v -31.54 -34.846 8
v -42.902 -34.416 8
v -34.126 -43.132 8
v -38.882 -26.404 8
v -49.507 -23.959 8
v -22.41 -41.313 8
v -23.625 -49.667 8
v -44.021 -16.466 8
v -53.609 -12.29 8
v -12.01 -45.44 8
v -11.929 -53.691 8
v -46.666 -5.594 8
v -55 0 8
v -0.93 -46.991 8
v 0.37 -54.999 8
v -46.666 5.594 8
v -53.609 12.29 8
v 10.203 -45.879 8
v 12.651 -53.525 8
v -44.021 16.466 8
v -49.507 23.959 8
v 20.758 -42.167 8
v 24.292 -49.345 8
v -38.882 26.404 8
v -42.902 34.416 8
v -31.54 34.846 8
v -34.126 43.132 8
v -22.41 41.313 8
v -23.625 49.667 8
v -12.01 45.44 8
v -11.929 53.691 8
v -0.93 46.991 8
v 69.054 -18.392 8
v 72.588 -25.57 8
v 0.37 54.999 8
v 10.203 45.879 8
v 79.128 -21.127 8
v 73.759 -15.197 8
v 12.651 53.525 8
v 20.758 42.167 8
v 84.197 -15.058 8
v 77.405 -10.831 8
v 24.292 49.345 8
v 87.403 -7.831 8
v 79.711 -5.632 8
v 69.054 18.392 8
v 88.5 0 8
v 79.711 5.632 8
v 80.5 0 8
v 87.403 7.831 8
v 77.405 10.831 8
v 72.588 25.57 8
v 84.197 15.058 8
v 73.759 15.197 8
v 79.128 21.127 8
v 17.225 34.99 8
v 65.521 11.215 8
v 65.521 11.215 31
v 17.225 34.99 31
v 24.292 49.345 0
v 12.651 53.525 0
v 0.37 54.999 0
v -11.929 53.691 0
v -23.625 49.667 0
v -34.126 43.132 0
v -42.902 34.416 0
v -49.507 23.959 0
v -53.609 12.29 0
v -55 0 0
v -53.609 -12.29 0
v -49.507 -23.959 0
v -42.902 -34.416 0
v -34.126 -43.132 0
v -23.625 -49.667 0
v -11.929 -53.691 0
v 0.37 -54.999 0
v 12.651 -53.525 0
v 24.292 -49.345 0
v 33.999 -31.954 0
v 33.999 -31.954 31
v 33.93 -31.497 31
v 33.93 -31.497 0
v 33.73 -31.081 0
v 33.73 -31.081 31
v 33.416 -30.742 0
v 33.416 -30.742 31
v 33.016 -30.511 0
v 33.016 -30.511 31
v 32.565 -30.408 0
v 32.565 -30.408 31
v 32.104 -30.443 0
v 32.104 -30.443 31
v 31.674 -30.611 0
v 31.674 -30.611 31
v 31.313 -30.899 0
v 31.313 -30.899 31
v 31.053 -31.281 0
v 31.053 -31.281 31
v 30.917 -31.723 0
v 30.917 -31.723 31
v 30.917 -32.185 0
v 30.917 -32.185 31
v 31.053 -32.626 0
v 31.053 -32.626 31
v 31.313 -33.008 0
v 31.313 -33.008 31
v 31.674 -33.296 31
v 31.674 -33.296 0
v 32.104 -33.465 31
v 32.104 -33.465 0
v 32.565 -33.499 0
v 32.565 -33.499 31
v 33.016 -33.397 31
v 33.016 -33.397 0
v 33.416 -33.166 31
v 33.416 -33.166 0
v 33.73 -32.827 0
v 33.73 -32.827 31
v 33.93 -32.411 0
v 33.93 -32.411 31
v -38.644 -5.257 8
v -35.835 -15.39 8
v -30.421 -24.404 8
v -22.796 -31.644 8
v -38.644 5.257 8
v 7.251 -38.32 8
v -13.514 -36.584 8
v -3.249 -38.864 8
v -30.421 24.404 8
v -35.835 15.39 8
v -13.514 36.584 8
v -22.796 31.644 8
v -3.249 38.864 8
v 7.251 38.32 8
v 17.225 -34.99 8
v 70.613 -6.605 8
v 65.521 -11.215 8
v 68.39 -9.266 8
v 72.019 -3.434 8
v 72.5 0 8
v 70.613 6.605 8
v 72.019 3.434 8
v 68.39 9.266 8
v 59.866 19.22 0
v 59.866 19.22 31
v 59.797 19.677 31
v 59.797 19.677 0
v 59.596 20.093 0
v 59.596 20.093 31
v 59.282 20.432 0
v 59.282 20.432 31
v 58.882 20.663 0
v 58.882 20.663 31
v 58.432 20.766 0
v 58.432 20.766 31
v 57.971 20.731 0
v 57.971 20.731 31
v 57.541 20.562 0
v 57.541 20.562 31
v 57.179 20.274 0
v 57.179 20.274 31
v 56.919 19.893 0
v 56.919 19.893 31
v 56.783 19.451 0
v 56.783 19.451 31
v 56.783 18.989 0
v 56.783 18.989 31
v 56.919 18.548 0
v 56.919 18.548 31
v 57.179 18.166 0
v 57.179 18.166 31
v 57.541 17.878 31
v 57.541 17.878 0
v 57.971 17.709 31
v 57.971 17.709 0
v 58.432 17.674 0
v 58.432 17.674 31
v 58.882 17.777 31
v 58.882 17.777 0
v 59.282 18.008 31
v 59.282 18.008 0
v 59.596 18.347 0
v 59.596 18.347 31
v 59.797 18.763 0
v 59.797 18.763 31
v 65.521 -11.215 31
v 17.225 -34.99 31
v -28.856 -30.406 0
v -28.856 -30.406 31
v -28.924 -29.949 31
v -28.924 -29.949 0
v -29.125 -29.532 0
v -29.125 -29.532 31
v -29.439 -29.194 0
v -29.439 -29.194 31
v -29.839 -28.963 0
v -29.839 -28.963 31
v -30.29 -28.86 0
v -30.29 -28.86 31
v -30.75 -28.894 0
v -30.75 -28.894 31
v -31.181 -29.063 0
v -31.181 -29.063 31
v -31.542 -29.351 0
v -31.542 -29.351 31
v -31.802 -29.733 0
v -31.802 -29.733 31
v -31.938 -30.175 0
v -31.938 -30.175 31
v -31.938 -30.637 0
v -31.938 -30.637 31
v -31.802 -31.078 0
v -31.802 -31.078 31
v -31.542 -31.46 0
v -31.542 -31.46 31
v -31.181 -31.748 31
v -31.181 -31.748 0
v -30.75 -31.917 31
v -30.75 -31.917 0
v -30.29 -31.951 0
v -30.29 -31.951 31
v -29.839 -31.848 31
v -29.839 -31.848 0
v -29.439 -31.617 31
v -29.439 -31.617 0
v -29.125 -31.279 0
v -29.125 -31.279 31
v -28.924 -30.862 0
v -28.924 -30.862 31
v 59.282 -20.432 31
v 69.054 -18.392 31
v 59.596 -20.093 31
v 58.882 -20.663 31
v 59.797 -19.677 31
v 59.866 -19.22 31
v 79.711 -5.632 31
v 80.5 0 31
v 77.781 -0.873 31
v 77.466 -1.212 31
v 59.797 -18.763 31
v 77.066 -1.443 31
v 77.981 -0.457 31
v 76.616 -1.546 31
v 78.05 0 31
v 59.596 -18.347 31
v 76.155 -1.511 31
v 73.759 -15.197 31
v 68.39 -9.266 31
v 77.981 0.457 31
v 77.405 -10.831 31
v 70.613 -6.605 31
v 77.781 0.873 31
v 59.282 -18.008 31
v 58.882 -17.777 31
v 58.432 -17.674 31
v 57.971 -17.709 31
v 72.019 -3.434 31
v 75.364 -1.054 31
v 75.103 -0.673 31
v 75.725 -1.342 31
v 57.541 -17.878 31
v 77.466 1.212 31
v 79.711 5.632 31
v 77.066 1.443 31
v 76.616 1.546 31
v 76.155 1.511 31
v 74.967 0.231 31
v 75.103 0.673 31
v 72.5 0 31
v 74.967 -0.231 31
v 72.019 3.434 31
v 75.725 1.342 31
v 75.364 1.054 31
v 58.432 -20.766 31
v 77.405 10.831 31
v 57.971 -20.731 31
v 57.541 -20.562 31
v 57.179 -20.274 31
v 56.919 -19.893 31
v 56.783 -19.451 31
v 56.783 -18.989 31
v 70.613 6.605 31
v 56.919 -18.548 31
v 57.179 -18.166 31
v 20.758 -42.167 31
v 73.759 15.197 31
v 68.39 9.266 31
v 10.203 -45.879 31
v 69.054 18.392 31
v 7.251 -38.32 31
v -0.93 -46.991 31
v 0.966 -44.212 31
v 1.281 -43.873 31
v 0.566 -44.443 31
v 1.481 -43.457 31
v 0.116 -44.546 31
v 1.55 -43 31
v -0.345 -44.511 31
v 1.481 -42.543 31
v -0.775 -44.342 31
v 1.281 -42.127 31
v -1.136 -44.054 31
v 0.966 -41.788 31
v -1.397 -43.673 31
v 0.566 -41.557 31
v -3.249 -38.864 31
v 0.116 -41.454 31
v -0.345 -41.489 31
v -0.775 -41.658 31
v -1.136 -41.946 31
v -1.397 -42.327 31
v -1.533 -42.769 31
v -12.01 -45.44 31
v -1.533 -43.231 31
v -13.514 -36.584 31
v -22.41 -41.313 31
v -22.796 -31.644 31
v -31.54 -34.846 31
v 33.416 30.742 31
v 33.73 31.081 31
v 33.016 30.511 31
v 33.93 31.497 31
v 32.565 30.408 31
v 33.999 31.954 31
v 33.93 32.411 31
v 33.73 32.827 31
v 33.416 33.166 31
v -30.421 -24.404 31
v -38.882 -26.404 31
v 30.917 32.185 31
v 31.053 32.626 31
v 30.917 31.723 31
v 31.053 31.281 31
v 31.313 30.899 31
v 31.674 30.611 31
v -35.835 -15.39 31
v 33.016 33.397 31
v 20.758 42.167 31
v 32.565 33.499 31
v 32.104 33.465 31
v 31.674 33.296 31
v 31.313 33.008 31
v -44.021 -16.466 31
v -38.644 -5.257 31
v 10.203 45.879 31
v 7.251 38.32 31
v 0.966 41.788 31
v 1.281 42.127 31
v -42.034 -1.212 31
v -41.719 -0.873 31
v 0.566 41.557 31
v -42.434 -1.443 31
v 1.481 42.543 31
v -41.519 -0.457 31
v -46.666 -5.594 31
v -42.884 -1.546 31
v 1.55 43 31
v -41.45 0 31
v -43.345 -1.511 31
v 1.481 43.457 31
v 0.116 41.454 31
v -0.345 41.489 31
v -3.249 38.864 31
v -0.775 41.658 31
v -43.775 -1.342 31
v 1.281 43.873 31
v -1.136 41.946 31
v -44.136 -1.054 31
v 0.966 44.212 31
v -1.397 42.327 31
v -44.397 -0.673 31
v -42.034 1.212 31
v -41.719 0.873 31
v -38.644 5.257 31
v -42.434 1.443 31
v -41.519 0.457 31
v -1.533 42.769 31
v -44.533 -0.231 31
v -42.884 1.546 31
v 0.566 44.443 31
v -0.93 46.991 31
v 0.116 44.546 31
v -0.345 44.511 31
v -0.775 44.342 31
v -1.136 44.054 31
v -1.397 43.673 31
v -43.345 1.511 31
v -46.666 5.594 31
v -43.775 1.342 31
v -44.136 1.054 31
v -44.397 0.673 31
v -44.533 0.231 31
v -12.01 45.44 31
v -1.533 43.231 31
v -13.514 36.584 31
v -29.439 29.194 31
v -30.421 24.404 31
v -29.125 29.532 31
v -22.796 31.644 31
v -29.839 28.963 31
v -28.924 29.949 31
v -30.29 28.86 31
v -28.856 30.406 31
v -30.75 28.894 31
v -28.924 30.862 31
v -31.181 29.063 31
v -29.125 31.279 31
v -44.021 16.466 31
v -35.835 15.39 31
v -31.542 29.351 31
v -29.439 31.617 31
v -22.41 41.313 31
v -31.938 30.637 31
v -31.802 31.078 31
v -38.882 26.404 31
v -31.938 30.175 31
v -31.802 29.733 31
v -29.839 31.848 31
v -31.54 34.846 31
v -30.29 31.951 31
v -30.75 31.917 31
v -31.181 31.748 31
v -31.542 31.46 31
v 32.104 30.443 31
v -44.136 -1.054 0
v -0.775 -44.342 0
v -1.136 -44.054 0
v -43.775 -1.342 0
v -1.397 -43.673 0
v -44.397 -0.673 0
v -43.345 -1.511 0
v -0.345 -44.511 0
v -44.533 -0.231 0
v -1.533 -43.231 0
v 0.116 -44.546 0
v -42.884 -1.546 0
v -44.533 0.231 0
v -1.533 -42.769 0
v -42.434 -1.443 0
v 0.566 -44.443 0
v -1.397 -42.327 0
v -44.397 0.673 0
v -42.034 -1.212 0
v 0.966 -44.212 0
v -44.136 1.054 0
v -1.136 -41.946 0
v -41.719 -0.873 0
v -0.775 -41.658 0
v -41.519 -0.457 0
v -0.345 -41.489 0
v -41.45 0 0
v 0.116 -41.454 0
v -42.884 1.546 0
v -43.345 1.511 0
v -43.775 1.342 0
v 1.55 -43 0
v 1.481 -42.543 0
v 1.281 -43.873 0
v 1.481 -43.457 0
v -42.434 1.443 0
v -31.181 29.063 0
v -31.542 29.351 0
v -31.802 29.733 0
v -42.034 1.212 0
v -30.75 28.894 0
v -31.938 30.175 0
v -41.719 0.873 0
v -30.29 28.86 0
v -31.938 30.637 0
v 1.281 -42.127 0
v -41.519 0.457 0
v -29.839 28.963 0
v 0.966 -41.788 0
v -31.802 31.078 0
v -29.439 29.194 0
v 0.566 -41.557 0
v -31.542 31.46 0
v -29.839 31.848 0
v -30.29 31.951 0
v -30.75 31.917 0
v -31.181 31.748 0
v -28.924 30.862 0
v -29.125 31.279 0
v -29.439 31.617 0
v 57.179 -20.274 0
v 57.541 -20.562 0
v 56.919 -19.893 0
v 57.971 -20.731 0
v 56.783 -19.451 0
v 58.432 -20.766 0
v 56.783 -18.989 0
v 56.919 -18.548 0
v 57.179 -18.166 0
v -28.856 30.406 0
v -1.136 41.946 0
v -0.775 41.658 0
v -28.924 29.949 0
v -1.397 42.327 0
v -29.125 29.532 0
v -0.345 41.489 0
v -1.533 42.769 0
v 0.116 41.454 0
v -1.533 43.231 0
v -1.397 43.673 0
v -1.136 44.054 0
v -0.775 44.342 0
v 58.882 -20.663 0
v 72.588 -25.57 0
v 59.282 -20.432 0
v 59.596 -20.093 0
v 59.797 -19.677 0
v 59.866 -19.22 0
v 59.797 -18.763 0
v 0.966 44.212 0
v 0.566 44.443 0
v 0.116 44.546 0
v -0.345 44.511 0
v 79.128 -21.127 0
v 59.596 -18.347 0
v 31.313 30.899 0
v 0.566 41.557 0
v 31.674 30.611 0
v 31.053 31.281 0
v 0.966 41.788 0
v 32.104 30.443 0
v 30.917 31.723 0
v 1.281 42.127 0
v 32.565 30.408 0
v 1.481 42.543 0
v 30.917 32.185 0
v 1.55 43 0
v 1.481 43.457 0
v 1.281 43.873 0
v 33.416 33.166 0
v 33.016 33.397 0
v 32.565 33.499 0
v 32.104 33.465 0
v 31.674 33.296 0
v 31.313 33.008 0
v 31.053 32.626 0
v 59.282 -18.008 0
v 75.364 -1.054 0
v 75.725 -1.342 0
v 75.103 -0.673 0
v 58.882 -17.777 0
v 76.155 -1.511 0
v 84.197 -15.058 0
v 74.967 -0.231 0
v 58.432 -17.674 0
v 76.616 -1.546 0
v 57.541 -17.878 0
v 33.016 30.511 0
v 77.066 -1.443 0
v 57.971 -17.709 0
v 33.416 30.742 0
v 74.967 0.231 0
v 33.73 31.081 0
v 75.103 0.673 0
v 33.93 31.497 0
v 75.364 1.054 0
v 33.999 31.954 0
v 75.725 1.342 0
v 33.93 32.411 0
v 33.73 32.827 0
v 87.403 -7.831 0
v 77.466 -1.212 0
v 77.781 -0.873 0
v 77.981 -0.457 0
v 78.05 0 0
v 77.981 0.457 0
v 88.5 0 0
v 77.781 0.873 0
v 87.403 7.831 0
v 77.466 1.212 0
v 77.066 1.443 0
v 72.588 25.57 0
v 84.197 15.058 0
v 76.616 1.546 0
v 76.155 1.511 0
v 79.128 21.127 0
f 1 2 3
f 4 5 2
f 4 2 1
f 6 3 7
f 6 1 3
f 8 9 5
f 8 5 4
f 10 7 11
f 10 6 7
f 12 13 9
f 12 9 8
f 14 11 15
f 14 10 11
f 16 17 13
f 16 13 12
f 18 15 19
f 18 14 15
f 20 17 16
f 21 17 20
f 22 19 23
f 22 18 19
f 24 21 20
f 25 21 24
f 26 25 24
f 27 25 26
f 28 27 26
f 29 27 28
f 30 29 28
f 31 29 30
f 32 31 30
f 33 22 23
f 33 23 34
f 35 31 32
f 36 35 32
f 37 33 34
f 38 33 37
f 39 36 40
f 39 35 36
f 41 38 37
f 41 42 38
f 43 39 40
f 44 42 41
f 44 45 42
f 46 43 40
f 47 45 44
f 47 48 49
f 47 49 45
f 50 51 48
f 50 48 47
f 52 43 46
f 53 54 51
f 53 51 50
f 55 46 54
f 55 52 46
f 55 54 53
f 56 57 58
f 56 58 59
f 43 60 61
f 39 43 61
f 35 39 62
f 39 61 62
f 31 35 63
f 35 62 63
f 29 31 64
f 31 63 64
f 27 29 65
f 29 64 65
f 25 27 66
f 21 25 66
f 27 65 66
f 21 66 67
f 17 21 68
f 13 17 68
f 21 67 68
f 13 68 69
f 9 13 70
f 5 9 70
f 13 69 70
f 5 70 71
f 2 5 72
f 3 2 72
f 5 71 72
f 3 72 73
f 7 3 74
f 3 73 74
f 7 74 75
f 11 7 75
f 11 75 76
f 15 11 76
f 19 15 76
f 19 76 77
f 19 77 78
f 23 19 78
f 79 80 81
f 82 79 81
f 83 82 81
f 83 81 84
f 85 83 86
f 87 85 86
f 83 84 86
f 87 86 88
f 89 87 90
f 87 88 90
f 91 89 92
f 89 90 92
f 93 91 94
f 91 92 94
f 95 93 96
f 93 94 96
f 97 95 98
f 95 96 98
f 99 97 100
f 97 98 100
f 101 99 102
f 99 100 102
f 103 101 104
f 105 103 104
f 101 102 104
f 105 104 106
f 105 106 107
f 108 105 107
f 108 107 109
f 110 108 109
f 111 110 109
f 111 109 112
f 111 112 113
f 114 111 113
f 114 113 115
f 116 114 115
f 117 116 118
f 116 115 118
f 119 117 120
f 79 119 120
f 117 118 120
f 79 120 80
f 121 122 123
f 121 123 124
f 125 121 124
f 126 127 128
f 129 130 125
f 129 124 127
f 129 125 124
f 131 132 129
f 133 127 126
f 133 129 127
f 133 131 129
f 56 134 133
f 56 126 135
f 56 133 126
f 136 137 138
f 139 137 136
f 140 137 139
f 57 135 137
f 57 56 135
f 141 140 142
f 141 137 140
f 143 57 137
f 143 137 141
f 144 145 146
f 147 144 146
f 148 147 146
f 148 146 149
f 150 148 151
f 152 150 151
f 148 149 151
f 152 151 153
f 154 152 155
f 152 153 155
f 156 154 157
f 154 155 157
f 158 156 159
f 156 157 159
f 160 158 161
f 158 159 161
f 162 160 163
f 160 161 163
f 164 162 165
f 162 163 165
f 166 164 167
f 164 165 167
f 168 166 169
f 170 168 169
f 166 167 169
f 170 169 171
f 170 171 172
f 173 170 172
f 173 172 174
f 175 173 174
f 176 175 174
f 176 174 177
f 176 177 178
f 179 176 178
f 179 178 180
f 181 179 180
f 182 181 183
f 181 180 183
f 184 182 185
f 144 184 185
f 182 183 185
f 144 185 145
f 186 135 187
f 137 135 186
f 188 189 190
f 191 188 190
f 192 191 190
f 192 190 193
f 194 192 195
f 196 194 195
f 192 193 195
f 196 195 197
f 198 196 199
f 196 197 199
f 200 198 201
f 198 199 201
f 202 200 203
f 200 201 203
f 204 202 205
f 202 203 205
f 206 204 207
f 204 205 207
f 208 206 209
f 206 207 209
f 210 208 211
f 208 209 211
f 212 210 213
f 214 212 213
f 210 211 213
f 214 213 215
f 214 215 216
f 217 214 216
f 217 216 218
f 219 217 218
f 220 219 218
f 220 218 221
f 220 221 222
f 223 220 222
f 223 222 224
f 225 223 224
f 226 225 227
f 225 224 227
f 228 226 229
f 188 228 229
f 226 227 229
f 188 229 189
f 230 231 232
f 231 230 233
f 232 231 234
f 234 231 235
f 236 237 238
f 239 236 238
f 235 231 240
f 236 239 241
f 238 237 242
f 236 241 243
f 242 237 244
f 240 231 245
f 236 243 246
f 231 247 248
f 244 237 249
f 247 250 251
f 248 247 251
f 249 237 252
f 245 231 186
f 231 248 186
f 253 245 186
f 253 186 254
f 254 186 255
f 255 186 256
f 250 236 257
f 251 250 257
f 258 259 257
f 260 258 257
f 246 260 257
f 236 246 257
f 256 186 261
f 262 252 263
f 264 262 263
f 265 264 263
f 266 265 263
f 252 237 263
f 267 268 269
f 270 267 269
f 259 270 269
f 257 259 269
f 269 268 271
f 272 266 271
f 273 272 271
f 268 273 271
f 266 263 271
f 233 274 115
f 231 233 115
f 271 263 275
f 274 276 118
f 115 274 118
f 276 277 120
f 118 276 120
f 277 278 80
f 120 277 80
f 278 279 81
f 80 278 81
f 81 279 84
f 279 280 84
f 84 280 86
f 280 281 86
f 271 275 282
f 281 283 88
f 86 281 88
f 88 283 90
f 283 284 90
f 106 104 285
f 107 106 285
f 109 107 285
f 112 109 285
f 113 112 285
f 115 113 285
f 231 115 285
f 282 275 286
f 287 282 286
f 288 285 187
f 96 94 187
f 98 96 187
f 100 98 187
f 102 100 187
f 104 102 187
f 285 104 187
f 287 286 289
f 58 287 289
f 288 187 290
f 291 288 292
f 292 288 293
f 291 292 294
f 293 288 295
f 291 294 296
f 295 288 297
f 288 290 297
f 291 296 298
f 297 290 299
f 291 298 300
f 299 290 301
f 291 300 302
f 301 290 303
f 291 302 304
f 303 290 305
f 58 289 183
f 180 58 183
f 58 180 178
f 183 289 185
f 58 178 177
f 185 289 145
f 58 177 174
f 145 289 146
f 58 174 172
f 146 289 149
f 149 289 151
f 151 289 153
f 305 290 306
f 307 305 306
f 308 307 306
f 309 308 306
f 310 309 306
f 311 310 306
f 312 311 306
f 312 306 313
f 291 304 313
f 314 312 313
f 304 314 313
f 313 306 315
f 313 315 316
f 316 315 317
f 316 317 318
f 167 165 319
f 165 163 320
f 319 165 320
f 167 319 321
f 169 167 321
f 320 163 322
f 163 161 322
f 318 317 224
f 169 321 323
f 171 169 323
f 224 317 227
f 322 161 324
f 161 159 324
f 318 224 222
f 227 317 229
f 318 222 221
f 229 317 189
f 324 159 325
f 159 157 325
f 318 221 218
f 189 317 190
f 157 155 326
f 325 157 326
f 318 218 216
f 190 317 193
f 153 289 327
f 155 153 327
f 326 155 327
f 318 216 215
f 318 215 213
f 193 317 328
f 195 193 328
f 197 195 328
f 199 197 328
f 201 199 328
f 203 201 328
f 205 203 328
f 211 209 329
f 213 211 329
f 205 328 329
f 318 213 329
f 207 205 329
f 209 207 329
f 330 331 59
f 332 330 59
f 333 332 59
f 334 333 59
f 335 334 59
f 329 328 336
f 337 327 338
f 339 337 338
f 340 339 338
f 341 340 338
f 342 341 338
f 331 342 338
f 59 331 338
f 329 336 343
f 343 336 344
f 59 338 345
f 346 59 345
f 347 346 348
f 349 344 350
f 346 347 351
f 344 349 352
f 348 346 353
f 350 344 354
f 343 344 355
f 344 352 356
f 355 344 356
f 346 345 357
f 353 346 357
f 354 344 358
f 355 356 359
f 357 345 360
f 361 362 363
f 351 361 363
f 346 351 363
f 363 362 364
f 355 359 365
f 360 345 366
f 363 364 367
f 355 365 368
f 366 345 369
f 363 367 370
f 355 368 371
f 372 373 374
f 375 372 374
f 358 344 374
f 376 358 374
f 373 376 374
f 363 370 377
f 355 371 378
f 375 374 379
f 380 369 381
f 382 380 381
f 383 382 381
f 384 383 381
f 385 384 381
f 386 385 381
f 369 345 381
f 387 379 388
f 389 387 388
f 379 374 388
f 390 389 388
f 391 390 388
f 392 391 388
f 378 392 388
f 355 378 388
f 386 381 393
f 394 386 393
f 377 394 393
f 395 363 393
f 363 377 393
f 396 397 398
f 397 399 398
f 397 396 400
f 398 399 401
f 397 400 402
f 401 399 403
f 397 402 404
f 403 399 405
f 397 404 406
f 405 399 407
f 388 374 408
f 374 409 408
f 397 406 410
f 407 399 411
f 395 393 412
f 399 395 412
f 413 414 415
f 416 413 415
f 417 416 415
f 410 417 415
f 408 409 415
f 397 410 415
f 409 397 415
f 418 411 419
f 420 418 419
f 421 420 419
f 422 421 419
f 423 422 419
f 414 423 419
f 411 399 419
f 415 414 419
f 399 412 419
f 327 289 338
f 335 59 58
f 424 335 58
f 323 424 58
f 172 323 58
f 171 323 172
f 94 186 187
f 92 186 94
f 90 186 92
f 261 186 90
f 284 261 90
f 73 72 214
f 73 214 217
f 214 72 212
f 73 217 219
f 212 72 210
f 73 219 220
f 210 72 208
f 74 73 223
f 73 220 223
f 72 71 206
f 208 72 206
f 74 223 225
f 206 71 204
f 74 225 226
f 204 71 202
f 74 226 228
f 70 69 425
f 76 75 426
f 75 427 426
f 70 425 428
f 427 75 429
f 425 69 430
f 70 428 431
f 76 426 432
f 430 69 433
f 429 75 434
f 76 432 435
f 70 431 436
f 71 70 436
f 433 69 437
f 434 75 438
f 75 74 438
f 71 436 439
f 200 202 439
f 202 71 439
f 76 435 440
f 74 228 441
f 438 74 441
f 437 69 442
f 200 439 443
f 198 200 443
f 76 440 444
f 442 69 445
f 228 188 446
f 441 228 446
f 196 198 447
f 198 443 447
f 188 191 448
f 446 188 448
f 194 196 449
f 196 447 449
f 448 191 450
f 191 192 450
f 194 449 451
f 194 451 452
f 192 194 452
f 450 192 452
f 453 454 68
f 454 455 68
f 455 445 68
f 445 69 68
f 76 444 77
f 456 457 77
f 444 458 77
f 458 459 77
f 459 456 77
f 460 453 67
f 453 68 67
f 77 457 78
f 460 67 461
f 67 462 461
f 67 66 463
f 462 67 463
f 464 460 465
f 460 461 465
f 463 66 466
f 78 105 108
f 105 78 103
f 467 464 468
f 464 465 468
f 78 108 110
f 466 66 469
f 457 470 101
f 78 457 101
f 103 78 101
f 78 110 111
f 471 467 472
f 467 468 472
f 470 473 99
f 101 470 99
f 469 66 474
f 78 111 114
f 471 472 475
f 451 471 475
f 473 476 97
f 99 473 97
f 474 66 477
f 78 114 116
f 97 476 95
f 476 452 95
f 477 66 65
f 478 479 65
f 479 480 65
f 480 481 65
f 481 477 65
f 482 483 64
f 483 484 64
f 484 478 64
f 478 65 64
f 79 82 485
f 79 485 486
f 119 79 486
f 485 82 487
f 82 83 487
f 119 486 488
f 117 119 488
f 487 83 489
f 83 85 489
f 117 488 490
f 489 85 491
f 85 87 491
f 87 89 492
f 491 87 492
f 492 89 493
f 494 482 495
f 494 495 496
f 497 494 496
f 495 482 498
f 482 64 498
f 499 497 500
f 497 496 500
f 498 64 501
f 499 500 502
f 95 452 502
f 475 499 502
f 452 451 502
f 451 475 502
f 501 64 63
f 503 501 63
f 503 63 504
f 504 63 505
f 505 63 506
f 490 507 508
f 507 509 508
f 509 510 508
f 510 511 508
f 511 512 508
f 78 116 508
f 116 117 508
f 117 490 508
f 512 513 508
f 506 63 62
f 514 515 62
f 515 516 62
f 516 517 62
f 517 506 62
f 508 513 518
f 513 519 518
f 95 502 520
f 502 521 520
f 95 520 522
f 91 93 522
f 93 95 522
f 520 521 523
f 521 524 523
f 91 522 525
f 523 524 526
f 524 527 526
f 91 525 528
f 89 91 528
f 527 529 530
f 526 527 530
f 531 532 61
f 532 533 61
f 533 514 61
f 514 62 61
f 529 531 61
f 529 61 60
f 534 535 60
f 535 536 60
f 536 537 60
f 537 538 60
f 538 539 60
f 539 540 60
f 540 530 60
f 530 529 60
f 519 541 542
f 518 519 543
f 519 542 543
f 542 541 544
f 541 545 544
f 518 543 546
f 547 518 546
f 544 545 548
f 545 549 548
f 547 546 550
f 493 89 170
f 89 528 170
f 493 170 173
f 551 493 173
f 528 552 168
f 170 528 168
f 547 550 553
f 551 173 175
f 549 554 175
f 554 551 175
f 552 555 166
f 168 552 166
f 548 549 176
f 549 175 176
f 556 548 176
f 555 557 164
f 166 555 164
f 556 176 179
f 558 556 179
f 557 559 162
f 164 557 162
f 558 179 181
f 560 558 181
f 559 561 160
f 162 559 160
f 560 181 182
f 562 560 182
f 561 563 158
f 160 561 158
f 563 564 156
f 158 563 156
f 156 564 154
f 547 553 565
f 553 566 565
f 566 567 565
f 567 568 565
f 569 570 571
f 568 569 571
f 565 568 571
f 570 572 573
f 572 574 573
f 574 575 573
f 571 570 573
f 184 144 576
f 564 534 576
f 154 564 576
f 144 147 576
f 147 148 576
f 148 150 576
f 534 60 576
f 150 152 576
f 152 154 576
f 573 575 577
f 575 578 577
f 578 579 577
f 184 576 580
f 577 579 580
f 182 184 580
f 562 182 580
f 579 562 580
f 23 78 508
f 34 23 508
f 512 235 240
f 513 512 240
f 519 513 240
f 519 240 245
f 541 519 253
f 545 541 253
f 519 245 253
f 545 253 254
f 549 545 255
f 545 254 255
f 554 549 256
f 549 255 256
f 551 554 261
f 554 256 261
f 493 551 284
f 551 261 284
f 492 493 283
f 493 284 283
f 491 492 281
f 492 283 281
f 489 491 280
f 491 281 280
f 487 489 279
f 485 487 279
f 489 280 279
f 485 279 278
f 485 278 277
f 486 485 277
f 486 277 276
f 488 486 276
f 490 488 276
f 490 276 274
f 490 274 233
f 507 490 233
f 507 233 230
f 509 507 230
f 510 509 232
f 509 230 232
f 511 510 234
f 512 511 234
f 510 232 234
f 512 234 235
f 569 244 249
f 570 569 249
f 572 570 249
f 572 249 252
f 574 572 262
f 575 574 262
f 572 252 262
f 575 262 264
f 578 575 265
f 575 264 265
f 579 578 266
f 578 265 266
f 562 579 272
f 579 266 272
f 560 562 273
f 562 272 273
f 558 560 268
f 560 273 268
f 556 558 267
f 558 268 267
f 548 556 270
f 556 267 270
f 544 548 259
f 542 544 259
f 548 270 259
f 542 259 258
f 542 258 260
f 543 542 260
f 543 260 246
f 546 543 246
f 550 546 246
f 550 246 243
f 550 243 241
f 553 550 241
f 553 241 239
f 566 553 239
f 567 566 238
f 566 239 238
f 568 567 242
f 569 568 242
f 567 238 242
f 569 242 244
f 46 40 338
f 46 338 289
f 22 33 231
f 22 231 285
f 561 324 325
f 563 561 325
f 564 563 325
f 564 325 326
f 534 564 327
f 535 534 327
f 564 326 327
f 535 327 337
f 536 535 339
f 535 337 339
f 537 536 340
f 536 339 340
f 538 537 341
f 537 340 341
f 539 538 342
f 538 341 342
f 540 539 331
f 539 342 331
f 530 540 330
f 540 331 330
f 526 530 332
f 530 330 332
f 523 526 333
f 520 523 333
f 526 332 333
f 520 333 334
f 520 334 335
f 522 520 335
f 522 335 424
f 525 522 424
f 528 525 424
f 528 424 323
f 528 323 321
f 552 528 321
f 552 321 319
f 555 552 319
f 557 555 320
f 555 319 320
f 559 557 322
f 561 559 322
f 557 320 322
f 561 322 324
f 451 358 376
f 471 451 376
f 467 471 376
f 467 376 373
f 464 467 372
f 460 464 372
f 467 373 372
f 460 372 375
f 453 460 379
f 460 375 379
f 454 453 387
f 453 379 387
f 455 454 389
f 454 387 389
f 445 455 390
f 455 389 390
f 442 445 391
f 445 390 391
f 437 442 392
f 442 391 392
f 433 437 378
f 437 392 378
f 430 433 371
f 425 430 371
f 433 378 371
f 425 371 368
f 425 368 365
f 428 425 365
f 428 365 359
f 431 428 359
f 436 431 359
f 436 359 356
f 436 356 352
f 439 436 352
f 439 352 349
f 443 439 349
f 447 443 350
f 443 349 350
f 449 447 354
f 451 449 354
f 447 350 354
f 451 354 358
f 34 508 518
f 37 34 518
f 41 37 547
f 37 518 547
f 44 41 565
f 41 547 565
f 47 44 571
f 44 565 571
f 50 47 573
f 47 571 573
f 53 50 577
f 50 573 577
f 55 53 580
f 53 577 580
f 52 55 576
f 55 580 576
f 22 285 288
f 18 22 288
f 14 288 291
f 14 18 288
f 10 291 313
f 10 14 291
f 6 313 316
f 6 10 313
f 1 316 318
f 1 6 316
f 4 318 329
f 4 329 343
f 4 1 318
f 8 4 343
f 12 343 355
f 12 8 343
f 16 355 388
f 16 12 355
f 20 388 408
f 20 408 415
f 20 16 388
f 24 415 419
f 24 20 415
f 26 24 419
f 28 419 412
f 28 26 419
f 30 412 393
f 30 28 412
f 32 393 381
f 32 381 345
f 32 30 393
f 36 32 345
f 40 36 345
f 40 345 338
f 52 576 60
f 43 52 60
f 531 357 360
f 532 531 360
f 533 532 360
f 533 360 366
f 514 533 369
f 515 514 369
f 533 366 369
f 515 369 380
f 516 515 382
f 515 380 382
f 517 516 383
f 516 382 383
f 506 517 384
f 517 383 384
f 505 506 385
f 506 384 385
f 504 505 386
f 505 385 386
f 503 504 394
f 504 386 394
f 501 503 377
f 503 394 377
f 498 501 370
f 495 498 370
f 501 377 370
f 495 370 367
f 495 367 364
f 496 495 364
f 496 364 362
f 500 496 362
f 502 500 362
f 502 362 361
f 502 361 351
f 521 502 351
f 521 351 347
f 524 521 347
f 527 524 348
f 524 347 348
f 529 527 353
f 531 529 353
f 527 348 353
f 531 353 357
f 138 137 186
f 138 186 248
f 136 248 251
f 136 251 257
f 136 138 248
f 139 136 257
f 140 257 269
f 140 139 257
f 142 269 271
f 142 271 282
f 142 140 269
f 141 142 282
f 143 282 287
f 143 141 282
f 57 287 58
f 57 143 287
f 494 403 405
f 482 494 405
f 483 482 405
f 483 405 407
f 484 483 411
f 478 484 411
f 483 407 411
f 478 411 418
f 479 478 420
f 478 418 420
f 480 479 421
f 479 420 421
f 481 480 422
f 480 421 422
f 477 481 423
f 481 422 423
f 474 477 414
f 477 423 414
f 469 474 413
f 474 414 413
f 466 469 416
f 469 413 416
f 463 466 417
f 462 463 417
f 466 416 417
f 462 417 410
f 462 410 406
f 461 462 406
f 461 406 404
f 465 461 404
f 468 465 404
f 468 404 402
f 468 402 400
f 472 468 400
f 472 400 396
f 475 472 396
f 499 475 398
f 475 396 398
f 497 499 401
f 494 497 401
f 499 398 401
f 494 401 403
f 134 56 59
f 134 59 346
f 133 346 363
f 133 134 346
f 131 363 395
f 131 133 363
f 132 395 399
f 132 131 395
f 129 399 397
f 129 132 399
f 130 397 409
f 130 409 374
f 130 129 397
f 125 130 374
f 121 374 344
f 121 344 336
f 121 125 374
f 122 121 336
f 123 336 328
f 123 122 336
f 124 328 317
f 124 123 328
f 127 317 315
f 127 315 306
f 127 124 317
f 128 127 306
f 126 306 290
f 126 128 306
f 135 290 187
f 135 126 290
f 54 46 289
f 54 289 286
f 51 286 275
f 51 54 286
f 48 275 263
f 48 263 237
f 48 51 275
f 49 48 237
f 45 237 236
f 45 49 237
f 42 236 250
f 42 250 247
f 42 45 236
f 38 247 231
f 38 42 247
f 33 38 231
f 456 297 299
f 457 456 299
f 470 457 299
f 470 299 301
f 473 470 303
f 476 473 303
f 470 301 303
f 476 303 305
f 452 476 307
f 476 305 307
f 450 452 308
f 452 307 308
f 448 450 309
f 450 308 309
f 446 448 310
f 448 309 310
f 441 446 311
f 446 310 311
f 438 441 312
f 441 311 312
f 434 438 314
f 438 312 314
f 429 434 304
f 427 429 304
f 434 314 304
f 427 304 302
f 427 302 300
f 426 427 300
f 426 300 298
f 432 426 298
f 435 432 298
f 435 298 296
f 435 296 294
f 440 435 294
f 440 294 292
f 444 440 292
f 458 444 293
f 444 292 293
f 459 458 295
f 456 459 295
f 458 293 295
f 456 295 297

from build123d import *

# Parameters (mm, degrees)
BOSS_EXTRUDE2_DEPTH = 8
BOSS_EXTRUDE3_DEPTH = 23
SKETCH6_R           = 1.55
CUT_EXTRUDE1_DEPTH  = 31


with BuildPart() as part:
    # Sketch1 → Boss-Extrude2 (new body)
    with BuildSketch(Plane.XY):
        with BuildLine():
            Line((72.5875, 25.569607814), (24.291666667, 49.344857184))
            ThreePointArc((24.291666667, 49.344857184), (-55, 0), (24.291666667, -49.344857184))
            Line((24.291666667, -49.344857184), (72.5875, -25.569607814))
            ThreePointArc((72.5875, -25.569607814), (88.5, 0), (72.5875, 25.569607814))
        make_face()
    extrude(amount=BOSS_EXTRUDE2_DEPTH)

    # Sketch5 → Boss-Extrude3 (add)
    with BuildSketch(Plane.XY.offset(8)):
        with BuildLine():
            Line((20.758333333, 42.167423412), (69.054166667, 18.392174041))
            ThreePointArc((69.054166667, 18.392174041), (80.5, 0), (69.054166667, -18.392174041))
            Line((69.054166667, -18.392174041), (20.758333333, -42.167423412))
            ThreePointArc((20.758333333, -42.167423412), (-47, 0), (20.758333333, 42.167423412))
        make_face()
        with BuildLine():
            Line((65.520833333, 11.214740269), (17.225, 34.98998964))
            ThreePointArc((17.225, 34.98998964), (-39, 0), (17.225, -34.98998964))
            Line((17.225, -34.98998964), (65.520833333, -11.214740269))
            ThreePointArc((65.520833333, -11.214740269), (72.5, 0), (65.520833333, 11.214740269))
        make_face(mode=Mode.SUBTRACT)
    extrude(amount=BOSS_EXTRUDE3_DEPTH)

    # Sketch6 → Cut-Extrude1 (cut)
    with BuildSketch(Plane.XY.offset(31)):
        with Locations((0, 43)):
            Circle(SKETCH6_R)
        with Locations((-30.405591591, 30.405591591)):
            Circle(SKETCH6_R)
        with Locations((-43, 0)):
            Circle(SKETCH6_R)
        with Locations((-30.405591591, -30.405591591)):
            Circle(SKETCH6_R)
        with Locations((0, -43)):
            Circle(SKETCH6_R)
        with Locations((76.5, 0)):
            Circle(SKETCH6_R)
        with Locations((58.315707785, 19.220123822)):
            Circle(SKETCH6_R)
        with Locations((32.44935499, 31.953706526)):
            Circle(SKETCH6_R)
        with Locations((58.315707785, -19.220123822)):
            Circle(SKETCH6_R)
        with Locations((32.44935499, -31.953706526)):
            Circle(SKETCH6_R)
    extrude(amount=-CUT_EXTRUDE1_DEPTH, mode=Mode.SUBTRACT)


solid = part.part
